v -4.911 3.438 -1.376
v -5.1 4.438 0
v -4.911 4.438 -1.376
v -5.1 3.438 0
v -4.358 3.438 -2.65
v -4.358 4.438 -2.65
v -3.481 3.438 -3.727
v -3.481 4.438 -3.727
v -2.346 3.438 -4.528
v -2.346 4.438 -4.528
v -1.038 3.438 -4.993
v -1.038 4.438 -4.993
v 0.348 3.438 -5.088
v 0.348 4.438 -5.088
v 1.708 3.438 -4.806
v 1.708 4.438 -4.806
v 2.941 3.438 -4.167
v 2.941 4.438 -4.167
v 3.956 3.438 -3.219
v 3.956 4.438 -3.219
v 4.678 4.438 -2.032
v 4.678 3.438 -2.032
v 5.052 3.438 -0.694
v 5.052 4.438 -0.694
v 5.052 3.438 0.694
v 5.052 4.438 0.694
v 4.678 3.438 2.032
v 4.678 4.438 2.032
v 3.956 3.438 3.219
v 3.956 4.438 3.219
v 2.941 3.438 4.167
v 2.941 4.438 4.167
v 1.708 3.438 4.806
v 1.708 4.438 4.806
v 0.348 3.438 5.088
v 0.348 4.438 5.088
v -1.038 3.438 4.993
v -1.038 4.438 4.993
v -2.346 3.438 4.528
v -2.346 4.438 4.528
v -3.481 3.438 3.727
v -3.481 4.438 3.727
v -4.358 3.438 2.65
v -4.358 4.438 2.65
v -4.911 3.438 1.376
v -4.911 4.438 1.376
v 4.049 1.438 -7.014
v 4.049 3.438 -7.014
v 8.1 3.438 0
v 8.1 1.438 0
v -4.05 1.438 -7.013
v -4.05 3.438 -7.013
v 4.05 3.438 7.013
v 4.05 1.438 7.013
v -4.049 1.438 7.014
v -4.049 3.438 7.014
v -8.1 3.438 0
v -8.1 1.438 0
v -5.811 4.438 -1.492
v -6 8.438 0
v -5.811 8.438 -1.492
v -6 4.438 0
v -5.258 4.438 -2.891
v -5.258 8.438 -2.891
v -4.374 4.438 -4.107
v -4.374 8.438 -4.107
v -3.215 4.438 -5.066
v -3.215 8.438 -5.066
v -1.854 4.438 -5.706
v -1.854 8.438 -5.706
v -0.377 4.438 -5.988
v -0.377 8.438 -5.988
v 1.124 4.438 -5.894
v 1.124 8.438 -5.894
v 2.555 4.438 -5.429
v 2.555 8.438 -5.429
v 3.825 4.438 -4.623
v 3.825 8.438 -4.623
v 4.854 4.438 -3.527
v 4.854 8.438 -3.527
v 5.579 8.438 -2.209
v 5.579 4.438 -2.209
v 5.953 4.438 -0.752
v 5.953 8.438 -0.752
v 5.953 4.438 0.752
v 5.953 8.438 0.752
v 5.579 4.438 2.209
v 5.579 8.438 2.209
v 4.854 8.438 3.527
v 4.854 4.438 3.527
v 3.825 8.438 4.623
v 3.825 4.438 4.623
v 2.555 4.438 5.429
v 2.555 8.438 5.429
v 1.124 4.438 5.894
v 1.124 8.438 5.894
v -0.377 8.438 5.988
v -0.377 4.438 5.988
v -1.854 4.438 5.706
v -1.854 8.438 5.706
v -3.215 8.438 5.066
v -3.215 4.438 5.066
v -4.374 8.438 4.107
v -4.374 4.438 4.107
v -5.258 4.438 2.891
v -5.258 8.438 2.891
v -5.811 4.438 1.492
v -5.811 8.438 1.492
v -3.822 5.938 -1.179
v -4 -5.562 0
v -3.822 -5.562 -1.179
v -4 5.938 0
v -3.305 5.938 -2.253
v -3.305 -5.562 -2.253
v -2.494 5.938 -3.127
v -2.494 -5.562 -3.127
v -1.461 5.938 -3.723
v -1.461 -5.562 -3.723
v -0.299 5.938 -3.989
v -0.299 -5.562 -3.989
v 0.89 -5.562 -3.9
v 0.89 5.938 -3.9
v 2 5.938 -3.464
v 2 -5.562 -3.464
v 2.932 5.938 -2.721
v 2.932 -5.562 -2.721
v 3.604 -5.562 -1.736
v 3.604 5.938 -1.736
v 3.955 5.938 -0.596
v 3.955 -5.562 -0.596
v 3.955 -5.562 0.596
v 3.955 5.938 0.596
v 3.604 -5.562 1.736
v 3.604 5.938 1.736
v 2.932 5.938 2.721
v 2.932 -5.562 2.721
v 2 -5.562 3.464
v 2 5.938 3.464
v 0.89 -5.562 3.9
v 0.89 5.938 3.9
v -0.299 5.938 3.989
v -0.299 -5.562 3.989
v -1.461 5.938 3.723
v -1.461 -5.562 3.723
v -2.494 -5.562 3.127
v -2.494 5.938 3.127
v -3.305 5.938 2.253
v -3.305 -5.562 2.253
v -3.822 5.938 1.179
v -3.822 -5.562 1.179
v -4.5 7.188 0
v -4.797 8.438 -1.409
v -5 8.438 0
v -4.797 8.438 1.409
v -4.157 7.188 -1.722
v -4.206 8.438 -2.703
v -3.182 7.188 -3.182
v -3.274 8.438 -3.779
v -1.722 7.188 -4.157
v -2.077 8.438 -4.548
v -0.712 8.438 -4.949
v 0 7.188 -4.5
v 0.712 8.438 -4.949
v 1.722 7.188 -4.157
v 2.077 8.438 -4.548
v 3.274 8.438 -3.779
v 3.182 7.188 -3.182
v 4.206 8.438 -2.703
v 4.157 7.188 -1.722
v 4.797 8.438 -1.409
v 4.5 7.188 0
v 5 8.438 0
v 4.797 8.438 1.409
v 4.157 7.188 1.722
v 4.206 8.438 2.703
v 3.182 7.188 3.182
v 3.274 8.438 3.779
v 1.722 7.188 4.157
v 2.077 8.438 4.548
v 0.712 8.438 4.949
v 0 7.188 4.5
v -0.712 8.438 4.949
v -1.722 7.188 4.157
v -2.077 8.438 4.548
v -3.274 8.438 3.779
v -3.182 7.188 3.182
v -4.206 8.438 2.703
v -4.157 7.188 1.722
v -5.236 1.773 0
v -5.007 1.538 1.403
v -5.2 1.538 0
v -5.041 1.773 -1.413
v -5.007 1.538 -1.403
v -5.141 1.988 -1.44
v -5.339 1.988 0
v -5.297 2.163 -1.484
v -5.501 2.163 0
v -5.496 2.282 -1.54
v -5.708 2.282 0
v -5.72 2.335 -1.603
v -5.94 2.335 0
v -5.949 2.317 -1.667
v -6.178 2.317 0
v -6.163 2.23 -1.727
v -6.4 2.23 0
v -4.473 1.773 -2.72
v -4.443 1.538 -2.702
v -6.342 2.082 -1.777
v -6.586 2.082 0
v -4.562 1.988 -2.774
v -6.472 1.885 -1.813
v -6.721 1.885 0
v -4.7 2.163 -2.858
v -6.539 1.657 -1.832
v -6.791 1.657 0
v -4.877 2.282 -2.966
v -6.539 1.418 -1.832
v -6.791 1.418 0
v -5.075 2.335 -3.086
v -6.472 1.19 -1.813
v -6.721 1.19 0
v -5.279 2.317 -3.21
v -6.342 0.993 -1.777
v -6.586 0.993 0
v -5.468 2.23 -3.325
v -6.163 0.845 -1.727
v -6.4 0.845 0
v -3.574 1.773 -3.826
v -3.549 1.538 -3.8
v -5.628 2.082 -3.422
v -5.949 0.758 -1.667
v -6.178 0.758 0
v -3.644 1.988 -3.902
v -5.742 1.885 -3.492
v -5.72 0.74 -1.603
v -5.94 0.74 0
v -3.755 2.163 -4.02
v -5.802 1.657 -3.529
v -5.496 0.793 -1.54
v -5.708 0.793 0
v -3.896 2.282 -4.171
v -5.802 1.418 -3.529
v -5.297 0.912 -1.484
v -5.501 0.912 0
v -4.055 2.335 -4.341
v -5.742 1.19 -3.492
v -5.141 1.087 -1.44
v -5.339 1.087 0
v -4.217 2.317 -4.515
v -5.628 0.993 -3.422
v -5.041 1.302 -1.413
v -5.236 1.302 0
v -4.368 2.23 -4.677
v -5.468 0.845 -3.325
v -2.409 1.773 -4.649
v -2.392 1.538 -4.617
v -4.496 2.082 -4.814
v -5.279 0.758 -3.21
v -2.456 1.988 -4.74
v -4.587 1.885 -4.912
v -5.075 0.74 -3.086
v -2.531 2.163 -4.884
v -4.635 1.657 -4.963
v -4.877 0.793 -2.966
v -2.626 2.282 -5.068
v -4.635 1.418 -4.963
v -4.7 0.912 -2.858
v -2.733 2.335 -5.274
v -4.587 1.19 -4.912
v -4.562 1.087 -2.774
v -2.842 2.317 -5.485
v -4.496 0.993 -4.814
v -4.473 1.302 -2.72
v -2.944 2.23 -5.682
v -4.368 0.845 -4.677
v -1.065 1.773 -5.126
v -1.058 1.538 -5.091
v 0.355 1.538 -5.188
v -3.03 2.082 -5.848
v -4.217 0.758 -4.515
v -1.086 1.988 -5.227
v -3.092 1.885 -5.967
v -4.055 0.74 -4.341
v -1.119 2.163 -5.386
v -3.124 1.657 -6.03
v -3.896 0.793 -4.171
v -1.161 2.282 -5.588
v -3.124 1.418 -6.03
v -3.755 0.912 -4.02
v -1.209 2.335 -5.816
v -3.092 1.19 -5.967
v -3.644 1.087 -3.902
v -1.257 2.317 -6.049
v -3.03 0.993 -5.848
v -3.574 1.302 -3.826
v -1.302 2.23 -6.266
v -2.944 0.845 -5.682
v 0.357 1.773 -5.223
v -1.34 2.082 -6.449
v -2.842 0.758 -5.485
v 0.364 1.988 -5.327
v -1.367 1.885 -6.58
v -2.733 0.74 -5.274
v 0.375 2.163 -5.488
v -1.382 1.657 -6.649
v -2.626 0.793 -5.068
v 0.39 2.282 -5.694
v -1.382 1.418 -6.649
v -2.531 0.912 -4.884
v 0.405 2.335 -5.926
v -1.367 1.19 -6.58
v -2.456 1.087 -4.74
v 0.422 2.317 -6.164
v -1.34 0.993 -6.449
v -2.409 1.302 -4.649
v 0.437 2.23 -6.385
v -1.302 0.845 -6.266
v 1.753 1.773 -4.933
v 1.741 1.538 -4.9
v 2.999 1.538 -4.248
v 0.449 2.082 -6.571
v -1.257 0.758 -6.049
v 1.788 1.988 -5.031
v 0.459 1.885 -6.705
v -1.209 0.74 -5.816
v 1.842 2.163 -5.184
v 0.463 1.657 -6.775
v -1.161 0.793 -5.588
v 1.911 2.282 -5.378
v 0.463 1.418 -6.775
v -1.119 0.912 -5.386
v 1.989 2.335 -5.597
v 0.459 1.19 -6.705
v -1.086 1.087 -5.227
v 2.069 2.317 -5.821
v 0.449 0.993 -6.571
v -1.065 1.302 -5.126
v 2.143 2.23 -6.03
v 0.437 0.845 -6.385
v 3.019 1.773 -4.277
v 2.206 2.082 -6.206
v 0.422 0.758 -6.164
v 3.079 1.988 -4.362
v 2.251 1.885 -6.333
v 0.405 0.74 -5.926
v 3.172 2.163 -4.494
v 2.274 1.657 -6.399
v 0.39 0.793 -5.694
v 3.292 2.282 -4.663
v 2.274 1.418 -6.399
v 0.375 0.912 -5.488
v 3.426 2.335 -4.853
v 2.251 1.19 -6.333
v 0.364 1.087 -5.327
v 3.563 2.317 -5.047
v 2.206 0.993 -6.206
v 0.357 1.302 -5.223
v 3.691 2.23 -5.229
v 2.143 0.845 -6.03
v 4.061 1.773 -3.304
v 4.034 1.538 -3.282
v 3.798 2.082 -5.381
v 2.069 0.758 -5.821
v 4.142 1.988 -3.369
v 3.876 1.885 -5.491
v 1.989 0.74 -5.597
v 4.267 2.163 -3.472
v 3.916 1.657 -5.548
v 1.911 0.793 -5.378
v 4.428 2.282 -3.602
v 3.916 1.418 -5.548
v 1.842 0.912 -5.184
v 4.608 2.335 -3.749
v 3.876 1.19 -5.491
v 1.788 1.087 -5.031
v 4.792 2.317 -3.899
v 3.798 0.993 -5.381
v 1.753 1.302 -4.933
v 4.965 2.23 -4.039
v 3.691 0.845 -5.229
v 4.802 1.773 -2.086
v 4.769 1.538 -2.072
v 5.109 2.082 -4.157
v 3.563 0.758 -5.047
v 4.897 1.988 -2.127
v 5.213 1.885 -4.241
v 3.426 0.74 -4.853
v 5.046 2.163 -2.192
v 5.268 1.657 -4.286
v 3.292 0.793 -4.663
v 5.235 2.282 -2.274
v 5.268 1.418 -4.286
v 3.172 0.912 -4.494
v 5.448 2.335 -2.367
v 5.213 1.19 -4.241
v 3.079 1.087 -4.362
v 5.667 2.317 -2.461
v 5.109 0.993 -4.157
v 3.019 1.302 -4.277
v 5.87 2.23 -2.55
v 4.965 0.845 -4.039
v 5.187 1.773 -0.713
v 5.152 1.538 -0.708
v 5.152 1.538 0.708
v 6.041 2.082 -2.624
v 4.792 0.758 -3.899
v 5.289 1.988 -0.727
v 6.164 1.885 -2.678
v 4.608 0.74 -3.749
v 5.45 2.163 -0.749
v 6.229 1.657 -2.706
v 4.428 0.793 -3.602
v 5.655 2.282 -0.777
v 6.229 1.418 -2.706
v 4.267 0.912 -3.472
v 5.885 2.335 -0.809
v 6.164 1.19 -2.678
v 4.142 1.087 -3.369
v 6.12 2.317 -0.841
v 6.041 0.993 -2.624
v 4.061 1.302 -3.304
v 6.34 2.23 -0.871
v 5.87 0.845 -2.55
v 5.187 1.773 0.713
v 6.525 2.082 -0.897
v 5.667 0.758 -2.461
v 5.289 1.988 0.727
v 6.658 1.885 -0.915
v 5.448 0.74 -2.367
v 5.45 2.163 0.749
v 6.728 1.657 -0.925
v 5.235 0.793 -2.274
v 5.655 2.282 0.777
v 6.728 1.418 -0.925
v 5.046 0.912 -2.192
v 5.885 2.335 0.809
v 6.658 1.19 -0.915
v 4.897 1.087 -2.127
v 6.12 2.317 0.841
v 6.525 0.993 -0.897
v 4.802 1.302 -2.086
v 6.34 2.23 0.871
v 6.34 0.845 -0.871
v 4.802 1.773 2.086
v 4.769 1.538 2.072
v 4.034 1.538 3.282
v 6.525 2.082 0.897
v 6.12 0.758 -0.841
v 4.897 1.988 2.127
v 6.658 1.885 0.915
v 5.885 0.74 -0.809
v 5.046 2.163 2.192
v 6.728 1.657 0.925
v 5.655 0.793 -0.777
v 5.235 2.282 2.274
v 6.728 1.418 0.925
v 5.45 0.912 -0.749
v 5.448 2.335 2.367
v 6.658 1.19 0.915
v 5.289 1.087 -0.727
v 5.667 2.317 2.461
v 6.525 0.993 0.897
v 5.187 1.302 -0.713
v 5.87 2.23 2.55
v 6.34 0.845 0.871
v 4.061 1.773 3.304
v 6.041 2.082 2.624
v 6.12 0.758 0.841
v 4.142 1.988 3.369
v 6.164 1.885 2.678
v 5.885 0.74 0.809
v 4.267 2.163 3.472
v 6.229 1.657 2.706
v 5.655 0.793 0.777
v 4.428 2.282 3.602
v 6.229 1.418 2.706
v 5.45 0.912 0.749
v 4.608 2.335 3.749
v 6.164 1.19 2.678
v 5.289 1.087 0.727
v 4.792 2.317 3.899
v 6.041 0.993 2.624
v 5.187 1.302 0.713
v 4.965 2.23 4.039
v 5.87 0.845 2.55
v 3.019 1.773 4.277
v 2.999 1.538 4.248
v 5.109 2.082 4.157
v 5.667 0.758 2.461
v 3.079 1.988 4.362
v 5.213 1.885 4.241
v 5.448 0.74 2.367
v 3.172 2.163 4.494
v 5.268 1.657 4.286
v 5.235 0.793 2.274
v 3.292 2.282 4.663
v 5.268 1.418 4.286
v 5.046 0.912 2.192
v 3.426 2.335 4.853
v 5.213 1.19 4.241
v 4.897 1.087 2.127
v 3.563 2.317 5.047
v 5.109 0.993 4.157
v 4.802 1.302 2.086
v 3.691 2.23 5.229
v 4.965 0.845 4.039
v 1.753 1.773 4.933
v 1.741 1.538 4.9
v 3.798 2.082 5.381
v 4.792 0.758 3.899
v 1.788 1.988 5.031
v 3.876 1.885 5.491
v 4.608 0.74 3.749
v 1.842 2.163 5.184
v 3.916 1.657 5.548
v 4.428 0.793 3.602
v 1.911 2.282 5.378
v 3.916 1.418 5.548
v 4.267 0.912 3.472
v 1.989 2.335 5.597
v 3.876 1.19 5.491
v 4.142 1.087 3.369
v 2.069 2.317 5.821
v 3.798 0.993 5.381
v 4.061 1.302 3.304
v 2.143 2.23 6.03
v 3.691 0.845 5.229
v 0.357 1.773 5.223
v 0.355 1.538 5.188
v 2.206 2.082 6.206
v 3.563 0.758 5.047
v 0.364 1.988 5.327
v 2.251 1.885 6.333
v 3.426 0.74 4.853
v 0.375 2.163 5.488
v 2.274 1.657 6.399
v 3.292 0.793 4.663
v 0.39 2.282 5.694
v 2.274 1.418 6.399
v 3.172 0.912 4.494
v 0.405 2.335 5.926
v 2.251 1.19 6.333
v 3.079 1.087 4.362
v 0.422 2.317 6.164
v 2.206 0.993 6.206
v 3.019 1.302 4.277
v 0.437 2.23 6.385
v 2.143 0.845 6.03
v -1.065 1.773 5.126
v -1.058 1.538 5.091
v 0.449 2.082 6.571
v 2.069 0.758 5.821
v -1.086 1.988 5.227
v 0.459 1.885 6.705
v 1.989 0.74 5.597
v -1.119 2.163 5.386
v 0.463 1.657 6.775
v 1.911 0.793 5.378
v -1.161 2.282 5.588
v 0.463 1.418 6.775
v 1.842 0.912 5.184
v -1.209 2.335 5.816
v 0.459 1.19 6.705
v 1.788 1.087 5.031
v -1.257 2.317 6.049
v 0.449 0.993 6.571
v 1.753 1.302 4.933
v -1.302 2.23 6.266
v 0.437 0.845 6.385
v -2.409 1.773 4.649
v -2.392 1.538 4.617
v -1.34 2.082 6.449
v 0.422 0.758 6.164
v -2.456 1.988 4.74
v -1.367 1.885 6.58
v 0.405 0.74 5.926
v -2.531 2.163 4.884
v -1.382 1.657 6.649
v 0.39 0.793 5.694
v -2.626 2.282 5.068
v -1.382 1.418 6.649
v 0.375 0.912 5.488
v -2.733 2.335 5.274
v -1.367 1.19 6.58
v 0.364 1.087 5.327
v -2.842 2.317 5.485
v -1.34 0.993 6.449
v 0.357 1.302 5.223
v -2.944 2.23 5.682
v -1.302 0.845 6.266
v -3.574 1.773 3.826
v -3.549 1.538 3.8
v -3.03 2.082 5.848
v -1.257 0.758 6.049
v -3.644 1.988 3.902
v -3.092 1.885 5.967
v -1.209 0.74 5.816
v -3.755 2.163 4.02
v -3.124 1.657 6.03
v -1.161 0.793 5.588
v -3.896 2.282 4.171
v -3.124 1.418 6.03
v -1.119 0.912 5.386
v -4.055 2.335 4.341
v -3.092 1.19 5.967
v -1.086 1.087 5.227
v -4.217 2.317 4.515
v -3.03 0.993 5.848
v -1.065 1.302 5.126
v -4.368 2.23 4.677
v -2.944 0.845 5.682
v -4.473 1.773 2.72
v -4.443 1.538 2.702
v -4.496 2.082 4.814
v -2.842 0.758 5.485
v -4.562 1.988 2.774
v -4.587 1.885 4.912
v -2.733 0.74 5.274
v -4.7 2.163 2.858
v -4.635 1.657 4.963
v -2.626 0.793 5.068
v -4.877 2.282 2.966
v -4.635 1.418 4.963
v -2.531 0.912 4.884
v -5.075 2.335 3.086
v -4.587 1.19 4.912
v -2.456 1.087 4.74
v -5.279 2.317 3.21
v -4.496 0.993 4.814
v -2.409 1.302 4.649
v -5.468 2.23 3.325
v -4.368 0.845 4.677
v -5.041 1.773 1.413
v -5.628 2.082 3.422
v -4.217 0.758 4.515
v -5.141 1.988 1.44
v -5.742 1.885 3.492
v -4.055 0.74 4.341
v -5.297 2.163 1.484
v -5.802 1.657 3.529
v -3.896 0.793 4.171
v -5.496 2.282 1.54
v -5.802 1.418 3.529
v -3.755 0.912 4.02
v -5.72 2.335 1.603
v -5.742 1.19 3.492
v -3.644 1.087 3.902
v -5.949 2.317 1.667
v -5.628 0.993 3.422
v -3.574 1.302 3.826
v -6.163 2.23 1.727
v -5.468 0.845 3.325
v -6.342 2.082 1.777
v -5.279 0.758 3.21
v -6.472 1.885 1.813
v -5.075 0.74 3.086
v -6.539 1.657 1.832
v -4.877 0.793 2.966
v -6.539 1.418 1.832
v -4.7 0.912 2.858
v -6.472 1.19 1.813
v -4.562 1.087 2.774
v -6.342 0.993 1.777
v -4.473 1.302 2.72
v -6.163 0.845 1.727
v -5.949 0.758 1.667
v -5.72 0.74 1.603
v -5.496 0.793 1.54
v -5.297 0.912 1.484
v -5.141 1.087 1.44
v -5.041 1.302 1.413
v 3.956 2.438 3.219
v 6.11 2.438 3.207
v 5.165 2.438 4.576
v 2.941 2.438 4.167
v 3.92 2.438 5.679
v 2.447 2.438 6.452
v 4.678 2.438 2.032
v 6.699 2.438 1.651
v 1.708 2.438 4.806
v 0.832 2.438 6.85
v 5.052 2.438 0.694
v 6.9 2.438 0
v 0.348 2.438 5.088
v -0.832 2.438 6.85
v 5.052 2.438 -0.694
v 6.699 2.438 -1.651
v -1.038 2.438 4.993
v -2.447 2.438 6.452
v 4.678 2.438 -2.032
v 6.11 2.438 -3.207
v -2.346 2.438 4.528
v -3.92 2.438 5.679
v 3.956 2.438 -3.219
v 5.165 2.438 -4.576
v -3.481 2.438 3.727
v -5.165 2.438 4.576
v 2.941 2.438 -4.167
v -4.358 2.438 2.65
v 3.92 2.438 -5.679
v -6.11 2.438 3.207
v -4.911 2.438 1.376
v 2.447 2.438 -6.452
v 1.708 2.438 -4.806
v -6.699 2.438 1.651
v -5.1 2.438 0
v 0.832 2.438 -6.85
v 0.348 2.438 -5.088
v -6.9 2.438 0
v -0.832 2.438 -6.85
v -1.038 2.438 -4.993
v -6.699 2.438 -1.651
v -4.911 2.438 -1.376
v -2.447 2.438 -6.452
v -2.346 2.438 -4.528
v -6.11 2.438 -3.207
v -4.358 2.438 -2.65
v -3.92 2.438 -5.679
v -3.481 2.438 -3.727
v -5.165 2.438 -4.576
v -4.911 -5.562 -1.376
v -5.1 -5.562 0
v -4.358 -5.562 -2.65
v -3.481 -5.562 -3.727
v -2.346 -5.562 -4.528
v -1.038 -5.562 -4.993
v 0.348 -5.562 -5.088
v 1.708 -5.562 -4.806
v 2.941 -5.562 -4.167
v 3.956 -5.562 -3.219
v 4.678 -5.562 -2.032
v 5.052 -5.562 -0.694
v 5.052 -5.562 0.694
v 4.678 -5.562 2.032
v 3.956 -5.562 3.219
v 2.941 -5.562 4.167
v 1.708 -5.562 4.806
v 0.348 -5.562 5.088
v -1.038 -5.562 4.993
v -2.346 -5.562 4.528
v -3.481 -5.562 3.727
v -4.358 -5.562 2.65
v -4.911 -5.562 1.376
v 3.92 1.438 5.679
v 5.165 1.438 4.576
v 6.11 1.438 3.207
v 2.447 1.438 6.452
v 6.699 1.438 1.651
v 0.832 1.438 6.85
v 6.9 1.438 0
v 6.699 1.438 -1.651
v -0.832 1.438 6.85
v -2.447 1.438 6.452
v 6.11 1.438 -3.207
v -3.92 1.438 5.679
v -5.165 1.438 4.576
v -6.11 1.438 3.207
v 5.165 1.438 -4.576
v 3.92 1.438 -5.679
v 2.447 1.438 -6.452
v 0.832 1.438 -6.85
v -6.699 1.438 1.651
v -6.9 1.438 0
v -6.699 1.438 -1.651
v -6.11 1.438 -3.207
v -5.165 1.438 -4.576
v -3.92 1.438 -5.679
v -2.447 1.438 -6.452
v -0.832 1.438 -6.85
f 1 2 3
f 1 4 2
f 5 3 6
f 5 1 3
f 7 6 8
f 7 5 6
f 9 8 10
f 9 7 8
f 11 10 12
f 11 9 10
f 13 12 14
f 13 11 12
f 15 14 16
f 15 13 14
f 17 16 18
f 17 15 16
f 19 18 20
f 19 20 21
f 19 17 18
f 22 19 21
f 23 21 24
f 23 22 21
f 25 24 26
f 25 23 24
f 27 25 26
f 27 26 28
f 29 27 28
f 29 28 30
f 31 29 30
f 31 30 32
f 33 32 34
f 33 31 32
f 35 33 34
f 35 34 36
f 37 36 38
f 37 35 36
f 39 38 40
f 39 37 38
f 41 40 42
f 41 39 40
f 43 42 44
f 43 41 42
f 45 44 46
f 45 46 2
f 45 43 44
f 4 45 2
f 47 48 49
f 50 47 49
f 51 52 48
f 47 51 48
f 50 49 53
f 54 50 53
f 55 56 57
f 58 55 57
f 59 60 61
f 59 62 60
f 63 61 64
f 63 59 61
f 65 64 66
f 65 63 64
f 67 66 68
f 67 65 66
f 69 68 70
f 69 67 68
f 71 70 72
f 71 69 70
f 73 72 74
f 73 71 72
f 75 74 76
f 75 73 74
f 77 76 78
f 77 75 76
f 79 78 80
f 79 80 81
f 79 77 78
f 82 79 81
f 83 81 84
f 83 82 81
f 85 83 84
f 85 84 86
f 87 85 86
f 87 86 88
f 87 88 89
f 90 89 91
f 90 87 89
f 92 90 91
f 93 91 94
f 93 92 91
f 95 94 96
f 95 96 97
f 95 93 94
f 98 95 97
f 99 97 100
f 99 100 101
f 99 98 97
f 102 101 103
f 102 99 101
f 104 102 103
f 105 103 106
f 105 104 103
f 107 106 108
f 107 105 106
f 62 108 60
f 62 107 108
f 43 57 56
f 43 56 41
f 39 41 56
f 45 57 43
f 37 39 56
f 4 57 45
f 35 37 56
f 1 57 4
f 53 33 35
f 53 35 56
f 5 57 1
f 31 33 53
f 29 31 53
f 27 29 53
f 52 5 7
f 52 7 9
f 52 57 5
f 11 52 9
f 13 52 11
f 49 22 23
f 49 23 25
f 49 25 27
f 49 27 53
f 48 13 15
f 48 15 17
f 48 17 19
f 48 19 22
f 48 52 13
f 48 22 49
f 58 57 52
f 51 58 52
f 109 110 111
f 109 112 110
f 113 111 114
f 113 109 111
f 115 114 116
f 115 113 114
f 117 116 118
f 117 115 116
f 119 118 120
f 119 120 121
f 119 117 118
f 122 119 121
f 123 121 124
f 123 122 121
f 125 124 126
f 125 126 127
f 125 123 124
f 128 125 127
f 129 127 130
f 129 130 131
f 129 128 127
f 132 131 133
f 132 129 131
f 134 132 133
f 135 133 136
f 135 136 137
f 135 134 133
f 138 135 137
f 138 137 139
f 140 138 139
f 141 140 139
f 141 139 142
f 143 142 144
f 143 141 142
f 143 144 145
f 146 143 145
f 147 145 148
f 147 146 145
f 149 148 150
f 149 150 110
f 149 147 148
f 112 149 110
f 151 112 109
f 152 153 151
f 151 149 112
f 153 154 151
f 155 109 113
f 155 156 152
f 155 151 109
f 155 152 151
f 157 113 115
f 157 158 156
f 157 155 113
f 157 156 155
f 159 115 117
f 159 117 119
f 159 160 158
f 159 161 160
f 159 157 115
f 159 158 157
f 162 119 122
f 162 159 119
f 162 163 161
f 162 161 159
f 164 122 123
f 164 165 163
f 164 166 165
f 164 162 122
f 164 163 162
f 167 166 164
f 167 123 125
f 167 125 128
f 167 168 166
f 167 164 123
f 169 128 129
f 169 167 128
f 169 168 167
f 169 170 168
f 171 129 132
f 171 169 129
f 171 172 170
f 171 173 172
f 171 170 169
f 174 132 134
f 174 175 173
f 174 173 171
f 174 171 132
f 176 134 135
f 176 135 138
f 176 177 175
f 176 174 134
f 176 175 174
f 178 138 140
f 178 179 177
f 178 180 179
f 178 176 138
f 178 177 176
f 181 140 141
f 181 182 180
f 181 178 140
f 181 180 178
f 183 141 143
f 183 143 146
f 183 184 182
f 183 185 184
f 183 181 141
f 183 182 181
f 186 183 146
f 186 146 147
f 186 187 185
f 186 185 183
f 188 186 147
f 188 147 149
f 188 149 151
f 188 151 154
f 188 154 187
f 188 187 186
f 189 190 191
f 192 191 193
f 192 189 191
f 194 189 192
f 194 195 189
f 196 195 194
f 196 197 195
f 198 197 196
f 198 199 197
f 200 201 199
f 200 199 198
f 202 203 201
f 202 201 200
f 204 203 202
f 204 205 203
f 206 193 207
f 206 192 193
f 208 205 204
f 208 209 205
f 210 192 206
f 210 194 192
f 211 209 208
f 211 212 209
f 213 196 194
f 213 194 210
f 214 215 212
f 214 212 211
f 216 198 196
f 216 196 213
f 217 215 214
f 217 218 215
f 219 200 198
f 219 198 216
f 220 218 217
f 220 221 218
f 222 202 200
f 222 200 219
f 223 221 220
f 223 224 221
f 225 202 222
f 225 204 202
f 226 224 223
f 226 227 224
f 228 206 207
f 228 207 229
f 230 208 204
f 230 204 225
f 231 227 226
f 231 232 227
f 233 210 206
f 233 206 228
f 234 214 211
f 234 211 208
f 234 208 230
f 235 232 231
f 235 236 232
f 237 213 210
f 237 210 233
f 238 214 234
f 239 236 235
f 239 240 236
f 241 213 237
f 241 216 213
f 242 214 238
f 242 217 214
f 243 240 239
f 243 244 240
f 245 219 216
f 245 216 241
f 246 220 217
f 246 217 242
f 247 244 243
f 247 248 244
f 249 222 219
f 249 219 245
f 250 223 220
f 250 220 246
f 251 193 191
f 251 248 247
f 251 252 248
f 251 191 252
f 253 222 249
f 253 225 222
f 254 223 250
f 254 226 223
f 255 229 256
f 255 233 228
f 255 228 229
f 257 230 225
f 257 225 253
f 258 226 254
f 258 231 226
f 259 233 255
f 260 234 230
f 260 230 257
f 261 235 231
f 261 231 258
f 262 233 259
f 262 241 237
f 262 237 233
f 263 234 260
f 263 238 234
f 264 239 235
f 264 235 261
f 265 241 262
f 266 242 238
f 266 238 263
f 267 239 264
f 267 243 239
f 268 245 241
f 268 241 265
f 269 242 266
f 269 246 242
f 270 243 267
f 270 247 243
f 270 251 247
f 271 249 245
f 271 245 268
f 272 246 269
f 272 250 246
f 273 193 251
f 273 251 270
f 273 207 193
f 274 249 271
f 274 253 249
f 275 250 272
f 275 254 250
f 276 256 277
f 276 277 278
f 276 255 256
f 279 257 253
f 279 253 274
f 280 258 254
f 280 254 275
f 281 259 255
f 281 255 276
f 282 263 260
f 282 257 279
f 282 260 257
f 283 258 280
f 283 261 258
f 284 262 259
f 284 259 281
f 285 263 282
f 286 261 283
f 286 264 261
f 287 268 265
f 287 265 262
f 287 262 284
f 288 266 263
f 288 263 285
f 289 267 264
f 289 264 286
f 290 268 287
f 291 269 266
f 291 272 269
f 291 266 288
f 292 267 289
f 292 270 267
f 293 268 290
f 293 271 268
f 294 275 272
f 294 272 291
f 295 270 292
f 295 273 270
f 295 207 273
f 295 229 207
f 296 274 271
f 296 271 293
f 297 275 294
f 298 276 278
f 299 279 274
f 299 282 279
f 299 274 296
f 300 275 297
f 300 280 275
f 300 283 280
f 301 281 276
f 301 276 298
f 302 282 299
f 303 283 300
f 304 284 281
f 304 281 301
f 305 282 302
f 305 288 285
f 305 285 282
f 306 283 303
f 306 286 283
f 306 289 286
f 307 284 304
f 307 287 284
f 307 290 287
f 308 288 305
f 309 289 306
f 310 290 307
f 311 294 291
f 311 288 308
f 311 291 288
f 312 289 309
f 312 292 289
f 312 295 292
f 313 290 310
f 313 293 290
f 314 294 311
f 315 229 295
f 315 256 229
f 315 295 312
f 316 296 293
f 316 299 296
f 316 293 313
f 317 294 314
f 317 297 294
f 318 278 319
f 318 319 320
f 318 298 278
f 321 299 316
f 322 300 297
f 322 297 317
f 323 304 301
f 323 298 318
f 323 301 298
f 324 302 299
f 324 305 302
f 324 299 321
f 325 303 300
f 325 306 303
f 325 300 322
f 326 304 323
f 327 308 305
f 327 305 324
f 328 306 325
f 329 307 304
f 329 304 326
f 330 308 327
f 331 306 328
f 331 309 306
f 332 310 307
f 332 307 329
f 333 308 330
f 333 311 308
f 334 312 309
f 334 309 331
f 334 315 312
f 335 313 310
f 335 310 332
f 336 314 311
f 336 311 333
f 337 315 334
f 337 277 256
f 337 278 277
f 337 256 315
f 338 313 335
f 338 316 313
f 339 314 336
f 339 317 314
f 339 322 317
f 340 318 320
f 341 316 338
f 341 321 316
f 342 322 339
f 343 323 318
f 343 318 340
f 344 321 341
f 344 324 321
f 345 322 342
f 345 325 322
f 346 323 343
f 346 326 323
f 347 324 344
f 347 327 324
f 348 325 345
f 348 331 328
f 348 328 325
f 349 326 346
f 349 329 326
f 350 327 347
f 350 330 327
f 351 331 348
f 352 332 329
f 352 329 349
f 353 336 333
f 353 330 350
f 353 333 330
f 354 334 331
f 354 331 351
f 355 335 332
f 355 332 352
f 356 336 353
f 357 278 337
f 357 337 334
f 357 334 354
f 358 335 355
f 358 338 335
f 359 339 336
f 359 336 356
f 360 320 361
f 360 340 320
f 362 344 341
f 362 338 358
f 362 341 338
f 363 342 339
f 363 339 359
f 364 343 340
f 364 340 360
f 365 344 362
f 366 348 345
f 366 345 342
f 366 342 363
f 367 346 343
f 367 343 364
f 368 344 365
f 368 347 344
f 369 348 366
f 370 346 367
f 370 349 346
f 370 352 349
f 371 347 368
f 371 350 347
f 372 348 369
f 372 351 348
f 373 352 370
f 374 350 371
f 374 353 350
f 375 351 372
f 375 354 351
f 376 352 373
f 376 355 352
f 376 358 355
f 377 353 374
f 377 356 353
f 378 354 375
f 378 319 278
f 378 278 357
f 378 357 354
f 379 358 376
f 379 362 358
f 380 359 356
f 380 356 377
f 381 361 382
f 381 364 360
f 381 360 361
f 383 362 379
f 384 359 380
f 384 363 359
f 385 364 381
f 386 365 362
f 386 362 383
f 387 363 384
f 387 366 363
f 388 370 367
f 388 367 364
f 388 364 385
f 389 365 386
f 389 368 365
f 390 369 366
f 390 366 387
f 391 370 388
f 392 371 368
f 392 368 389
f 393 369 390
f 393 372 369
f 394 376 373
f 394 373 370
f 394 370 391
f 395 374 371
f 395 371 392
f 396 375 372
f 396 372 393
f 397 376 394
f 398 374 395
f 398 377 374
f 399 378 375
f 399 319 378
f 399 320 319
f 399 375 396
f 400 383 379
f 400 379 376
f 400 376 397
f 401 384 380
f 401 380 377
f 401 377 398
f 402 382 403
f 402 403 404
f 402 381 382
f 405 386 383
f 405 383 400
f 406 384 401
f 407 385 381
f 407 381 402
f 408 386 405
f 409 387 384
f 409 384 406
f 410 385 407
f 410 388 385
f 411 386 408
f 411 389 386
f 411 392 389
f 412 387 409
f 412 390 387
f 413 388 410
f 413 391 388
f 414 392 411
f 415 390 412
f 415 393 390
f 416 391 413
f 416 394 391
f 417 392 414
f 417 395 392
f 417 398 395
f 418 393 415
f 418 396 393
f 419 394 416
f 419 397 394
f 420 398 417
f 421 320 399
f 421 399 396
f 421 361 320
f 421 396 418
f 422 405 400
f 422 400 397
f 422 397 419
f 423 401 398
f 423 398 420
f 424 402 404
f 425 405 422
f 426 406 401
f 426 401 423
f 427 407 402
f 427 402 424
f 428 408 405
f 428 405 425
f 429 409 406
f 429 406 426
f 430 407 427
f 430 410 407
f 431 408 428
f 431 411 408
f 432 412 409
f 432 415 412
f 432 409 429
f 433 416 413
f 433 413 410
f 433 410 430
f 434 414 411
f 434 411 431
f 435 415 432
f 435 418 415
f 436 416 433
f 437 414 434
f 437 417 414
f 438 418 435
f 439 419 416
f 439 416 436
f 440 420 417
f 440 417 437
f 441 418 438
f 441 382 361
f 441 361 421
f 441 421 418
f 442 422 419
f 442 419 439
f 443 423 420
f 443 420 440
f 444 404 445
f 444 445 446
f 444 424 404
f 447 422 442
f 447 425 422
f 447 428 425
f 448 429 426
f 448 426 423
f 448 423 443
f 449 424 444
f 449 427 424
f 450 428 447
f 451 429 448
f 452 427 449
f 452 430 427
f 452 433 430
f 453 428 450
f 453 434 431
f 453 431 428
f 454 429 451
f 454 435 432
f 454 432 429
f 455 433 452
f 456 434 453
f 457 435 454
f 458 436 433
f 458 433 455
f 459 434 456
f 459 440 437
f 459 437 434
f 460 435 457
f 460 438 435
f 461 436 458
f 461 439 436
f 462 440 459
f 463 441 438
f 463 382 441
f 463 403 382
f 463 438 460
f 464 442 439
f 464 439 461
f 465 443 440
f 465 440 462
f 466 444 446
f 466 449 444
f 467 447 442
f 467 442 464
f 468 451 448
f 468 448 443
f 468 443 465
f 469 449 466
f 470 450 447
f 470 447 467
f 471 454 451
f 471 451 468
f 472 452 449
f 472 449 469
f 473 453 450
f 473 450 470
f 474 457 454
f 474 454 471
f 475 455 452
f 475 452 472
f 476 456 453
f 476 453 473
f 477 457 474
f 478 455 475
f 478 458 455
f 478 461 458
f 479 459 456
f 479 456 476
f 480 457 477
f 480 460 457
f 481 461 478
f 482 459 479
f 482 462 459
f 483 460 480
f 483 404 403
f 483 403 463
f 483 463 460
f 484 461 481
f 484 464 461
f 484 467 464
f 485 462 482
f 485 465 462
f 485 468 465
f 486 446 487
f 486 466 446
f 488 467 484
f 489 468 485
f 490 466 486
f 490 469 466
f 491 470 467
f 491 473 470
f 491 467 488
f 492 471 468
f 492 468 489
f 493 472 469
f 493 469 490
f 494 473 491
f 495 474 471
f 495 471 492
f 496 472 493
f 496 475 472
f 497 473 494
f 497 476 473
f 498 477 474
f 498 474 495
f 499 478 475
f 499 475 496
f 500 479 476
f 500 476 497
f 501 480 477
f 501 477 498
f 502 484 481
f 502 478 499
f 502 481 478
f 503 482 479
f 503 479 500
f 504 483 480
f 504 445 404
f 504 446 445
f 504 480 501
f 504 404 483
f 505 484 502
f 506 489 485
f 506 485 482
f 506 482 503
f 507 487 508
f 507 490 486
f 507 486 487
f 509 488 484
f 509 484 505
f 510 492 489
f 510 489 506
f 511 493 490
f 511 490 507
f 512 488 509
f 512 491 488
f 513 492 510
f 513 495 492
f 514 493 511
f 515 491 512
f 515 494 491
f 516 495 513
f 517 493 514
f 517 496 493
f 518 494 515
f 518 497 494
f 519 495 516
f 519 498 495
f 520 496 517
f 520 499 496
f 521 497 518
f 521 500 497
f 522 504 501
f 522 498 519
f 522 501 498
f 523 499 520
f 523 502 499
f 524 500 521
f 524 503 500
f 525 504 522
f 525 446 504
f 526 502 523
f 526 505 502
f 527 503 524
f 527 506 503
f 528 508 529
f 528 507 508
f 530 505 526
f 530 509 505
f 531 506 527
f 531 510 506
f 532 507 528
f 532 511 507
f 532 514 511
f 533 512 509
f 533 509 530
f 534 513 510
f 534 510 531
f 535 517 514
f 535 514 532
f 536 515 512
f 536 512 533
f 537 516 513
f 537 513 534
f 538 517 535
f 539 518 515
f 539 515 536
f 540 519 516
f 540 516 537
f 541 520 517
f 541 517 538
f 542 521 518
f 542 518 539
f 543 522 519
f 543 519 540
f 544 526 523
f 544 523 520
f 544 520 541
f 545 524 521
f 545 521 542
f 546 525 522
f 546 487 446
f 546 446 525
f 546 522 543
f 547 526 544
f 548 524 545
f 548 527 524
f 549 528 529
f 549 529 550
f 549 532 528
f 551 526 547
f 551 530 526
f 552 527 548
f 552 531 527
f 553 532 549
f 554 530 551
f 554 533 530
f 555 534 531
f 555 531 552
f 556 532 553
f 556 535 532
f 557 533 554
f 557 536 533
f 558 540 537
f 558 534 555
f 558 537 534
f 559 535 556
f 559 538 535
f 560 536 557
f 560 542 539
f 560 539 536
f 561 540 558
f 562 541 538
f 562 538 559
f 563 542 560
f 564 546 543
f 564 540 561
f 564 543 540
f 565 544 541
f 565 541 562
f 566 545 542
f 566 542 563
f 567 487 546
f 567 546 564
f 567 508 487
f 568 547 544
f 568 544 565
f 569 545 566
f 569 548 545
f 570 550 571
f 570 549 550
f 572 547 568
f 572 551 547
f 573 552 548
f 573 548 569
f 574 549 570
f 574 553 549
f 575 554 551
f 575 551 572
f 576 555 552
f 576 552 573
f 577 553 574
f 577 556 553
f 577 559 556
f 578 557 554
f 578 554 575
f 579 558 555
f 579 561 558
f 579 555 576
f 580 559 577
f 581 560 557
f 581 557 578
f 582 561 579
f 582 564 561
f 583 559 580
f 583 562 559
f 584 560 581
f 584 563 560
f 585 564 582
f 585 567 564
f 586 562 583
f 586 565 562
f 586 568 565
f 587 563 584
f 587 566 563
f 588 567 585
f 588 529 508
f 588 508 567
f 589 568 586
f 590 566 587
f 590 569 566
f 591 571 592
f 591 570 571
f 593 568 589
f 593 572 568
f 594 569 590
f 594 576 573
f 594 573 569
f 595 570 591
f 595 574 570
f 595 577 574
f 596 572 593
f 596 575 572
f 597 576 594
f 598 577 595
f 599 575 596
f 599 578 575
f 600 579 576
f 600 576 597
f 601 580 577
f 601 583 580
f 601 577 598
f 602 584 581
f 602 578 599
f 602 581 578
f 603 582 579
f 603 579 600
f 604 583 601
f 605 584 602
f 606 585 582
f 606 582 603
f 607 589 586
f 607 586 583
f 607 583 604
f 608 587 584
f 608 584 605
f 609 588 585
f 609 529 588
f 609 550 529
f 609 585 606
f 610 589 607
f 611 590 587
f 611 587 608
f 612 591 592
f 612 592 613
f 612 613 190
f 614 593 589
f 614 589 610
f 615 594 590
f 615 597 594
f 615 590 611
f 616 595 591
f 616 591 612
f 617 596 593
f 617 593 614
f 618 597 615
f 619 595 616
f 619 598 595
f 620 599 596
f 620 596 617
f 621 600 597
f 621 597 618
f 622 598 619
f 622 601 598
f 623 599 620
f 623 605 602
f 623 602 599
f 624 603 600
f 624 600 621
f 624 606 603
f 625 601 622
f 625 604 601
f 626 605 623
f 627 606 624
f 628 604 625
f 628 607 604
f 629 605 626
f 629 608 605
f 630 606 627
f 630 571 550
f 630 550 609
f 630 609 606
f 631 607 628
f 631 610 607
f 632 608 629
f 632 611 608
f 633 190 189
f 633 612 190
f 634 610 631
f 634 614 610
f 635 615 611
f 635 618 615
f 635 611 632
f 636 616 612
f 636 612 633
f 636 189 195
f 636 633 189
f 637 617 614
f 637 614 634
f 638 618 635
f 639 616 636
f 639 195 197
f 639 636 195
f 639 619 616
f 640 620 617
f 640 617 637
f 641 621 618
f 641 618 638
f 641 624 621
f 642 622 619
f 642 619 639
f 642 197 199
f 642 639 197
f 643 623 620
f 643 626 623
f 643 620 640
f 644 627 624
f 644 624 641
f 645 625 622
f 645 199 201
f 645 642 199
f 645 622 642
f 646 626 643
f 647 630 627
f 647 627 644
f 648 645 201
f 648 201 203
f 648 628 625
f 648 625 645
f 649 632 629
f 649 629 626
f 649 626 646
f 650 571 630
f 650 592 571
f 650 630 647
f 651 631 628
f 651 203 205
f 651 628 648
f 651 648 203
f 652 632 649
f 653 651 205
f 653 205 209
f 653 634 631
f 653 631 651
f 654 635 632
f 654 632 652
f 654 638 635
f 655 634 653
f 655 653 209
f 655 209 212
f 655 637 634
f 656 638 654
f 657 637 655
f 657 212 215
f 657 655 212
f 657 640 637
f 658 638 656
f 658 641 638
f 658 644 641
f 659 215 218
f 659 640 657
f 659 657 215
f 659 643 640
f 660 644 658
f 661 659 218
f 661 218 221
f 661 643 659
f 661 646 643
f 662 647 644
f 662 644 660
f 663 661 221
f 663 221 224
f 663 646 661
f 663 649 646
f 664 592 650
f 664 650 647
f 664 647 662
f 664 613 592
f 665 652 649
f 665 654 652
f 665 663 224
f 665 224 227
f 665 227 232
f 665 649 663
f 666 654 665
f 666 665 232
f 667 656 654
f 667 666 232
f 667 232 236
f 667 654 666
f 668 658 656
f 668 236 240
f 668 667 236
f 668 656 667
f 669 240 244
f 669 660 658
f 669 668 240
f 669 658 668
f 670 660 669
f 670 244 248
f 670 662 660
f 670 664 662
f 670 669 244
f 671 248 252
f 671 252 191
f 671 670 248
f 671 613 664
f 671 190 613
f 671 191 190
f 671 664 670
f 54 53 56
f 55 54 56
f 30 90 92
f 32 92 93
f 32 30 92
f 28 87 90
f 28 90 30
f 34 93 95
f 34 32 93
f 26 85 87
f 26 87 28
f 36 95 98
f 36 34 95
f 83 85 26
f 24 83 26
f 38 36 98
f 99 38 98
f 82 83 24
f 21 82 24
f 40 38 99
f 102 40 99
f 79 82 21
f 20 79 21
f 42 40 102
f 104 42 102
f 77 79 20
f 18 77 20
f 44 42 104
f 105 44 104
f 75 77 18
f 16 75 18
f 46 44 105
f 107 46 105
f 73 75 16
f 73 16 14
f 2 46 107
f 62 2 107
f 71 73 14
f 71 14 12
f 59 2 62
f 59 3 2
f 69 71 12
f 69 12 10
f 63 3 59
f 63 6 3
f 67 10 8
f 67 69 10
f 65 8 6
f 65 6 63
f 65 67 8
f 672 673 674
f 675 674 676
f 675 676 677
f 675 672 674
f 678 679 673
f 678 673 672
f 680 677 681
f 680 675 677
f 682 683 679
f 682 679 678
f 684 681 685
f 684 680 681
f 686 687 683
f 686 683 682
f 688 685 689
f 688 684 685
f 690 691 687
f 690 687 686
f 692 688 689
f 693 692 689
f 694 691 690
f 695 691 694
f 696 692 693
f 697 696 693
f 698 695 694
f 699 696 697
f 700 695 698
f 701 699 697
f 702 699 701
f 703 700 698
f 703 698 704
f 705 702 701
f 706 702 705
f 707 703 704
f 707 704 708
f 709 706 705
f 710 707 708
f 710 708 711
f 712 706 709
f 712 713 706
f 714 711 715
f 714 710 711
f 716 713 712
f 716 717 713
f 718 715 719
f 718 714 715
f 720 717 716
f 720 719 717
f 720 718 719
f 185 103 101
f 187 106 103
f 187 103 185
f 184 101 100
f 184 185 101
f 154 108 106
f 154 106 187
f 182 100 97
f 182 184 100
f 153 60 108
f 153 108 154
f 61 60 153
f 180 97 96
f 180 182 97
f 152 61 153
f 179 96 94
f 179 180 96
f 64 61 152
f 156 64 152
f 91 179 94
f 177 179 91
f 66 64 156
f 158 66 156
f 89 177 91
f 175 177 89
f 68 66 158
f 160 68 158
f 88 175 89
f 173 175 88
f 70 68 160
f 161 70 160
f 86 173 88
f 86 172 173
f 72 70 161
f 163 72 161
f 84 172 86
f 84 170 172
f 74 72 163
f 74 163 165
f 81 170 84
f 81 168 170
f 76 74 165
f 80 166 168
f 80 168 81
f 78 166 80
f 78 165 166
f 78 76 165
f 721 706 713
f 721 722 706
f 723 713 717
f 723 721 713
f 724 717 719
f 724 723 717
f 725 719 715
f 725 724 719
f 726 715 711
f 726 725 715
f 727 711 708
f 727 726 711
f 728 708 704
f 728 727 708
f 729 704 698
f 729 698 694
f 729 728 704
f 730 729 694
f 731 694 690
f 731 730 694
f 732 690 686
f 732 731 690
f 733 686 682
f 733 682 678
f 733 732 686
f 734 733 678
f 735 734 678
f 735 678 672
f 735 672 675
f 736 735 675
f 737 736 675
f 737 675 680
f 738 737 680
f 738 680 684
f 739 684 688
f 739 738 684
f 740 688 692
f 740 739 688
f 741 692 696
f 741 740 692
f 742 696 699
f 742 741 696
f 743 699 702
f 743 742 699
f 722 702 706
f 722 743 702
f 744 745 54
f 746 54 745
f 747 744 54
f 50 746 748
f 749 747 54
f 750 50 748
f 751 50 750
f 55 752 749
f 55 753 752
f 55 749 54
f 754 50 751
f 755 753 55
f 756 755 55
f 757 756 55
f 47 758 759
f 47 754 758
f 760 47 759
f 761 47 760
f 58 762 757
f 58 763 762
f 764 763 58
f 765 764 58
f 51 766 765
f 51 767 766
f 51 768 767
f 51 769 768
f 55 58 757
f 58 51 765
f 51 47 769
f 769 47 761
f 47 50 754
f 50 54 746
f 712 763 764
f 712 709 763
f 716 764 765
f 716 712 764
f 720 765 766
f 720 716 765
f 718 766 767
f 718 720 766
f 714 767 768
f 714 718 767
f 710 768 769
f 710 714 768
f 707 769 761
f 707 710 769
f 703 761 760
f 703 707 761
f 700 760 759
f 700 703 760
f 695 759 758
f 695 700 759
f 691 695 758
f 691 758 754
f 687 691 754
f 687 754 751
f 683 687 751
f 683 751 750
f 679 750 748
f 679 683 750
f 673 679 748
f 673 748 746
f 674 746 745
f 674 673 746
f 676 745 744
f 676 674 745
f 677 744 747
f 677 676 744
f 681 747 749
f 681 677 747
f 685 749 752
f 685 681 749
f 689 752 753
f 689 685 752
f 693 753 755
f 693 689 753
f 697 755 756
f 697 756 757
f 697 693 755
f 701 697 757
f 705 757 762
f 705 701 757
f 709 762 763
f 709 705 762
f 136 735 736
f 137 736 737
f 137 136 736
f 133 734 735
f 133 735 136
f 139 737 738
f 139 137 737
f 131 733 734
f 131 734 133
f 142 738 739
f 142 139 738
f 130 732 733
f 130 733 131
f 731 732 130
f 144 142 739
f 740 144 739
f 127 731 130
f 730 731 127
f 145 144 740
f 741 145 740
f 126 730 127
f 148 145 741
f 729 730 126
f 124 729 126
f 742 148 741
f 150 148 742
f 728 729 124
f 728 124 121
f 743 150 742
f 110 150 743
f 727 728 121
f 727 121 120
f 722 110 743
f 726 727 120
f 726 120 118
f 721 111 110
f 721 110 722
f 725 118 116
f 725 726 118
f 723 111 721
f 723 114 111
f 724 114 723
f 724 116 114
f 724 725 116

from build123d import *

# Parameters (mm, degrees)
SKETCH_1_R          = 0.8
SKETCH_3_R          = 12.642414599
CUT_EXTRUDE_2_DEPTH = 10


with BuildPart() as part:
    # Эскиз1 → Повернуть1 (revolve)
    with BuildSketch(Plane.XY):
        with Locations((-6, 1.537505723)):
            Circle(SKETCH_1_R)
        Polygon((-5.1, 3.437505723), (-8.1, 3.437505723), (-8.1, 1.437505723), (-6.9, 1.437505723), (-6.9, 2.437505723), (-5.1, 2.437505723), (-5.1, 1.437505723), (-5.1, -5.562494277), (-4, -5.562494277), (-4, 5.937505723), (-5, 8.437505723), (-6, 8.437505723), (-6, 4.437505723), (-5.1, 4.437505723), align=None)
    revolve(axis=Axis((0, 12.440414794, 0), (0, -1, 0)))

    # Эскиз3 → Вырез-Вытянуть2 (cut)
    with BuildSketch(Plane(origin=(0, 3.437505723, 0), x_dir=(1, 0, 0), z_dir=(0, 1, 0))):
        with Locations((0.002, 0)):
            Circle(SKETCH_3_R)
        Polygon((-8.1, 0), (-4.050366025, 7.013439745), (4.048633975, 7.014439745), (8.1, 0), (4.050366025, -7.013439745), (-4.048633975, -7.014439745), align=None, mode=Mode.SUBTRACT)
    extrude(amount=-CUT_EXTRUDE_2_DEPTH, mode=Mode.SUBTRACT)


solid = part.part
